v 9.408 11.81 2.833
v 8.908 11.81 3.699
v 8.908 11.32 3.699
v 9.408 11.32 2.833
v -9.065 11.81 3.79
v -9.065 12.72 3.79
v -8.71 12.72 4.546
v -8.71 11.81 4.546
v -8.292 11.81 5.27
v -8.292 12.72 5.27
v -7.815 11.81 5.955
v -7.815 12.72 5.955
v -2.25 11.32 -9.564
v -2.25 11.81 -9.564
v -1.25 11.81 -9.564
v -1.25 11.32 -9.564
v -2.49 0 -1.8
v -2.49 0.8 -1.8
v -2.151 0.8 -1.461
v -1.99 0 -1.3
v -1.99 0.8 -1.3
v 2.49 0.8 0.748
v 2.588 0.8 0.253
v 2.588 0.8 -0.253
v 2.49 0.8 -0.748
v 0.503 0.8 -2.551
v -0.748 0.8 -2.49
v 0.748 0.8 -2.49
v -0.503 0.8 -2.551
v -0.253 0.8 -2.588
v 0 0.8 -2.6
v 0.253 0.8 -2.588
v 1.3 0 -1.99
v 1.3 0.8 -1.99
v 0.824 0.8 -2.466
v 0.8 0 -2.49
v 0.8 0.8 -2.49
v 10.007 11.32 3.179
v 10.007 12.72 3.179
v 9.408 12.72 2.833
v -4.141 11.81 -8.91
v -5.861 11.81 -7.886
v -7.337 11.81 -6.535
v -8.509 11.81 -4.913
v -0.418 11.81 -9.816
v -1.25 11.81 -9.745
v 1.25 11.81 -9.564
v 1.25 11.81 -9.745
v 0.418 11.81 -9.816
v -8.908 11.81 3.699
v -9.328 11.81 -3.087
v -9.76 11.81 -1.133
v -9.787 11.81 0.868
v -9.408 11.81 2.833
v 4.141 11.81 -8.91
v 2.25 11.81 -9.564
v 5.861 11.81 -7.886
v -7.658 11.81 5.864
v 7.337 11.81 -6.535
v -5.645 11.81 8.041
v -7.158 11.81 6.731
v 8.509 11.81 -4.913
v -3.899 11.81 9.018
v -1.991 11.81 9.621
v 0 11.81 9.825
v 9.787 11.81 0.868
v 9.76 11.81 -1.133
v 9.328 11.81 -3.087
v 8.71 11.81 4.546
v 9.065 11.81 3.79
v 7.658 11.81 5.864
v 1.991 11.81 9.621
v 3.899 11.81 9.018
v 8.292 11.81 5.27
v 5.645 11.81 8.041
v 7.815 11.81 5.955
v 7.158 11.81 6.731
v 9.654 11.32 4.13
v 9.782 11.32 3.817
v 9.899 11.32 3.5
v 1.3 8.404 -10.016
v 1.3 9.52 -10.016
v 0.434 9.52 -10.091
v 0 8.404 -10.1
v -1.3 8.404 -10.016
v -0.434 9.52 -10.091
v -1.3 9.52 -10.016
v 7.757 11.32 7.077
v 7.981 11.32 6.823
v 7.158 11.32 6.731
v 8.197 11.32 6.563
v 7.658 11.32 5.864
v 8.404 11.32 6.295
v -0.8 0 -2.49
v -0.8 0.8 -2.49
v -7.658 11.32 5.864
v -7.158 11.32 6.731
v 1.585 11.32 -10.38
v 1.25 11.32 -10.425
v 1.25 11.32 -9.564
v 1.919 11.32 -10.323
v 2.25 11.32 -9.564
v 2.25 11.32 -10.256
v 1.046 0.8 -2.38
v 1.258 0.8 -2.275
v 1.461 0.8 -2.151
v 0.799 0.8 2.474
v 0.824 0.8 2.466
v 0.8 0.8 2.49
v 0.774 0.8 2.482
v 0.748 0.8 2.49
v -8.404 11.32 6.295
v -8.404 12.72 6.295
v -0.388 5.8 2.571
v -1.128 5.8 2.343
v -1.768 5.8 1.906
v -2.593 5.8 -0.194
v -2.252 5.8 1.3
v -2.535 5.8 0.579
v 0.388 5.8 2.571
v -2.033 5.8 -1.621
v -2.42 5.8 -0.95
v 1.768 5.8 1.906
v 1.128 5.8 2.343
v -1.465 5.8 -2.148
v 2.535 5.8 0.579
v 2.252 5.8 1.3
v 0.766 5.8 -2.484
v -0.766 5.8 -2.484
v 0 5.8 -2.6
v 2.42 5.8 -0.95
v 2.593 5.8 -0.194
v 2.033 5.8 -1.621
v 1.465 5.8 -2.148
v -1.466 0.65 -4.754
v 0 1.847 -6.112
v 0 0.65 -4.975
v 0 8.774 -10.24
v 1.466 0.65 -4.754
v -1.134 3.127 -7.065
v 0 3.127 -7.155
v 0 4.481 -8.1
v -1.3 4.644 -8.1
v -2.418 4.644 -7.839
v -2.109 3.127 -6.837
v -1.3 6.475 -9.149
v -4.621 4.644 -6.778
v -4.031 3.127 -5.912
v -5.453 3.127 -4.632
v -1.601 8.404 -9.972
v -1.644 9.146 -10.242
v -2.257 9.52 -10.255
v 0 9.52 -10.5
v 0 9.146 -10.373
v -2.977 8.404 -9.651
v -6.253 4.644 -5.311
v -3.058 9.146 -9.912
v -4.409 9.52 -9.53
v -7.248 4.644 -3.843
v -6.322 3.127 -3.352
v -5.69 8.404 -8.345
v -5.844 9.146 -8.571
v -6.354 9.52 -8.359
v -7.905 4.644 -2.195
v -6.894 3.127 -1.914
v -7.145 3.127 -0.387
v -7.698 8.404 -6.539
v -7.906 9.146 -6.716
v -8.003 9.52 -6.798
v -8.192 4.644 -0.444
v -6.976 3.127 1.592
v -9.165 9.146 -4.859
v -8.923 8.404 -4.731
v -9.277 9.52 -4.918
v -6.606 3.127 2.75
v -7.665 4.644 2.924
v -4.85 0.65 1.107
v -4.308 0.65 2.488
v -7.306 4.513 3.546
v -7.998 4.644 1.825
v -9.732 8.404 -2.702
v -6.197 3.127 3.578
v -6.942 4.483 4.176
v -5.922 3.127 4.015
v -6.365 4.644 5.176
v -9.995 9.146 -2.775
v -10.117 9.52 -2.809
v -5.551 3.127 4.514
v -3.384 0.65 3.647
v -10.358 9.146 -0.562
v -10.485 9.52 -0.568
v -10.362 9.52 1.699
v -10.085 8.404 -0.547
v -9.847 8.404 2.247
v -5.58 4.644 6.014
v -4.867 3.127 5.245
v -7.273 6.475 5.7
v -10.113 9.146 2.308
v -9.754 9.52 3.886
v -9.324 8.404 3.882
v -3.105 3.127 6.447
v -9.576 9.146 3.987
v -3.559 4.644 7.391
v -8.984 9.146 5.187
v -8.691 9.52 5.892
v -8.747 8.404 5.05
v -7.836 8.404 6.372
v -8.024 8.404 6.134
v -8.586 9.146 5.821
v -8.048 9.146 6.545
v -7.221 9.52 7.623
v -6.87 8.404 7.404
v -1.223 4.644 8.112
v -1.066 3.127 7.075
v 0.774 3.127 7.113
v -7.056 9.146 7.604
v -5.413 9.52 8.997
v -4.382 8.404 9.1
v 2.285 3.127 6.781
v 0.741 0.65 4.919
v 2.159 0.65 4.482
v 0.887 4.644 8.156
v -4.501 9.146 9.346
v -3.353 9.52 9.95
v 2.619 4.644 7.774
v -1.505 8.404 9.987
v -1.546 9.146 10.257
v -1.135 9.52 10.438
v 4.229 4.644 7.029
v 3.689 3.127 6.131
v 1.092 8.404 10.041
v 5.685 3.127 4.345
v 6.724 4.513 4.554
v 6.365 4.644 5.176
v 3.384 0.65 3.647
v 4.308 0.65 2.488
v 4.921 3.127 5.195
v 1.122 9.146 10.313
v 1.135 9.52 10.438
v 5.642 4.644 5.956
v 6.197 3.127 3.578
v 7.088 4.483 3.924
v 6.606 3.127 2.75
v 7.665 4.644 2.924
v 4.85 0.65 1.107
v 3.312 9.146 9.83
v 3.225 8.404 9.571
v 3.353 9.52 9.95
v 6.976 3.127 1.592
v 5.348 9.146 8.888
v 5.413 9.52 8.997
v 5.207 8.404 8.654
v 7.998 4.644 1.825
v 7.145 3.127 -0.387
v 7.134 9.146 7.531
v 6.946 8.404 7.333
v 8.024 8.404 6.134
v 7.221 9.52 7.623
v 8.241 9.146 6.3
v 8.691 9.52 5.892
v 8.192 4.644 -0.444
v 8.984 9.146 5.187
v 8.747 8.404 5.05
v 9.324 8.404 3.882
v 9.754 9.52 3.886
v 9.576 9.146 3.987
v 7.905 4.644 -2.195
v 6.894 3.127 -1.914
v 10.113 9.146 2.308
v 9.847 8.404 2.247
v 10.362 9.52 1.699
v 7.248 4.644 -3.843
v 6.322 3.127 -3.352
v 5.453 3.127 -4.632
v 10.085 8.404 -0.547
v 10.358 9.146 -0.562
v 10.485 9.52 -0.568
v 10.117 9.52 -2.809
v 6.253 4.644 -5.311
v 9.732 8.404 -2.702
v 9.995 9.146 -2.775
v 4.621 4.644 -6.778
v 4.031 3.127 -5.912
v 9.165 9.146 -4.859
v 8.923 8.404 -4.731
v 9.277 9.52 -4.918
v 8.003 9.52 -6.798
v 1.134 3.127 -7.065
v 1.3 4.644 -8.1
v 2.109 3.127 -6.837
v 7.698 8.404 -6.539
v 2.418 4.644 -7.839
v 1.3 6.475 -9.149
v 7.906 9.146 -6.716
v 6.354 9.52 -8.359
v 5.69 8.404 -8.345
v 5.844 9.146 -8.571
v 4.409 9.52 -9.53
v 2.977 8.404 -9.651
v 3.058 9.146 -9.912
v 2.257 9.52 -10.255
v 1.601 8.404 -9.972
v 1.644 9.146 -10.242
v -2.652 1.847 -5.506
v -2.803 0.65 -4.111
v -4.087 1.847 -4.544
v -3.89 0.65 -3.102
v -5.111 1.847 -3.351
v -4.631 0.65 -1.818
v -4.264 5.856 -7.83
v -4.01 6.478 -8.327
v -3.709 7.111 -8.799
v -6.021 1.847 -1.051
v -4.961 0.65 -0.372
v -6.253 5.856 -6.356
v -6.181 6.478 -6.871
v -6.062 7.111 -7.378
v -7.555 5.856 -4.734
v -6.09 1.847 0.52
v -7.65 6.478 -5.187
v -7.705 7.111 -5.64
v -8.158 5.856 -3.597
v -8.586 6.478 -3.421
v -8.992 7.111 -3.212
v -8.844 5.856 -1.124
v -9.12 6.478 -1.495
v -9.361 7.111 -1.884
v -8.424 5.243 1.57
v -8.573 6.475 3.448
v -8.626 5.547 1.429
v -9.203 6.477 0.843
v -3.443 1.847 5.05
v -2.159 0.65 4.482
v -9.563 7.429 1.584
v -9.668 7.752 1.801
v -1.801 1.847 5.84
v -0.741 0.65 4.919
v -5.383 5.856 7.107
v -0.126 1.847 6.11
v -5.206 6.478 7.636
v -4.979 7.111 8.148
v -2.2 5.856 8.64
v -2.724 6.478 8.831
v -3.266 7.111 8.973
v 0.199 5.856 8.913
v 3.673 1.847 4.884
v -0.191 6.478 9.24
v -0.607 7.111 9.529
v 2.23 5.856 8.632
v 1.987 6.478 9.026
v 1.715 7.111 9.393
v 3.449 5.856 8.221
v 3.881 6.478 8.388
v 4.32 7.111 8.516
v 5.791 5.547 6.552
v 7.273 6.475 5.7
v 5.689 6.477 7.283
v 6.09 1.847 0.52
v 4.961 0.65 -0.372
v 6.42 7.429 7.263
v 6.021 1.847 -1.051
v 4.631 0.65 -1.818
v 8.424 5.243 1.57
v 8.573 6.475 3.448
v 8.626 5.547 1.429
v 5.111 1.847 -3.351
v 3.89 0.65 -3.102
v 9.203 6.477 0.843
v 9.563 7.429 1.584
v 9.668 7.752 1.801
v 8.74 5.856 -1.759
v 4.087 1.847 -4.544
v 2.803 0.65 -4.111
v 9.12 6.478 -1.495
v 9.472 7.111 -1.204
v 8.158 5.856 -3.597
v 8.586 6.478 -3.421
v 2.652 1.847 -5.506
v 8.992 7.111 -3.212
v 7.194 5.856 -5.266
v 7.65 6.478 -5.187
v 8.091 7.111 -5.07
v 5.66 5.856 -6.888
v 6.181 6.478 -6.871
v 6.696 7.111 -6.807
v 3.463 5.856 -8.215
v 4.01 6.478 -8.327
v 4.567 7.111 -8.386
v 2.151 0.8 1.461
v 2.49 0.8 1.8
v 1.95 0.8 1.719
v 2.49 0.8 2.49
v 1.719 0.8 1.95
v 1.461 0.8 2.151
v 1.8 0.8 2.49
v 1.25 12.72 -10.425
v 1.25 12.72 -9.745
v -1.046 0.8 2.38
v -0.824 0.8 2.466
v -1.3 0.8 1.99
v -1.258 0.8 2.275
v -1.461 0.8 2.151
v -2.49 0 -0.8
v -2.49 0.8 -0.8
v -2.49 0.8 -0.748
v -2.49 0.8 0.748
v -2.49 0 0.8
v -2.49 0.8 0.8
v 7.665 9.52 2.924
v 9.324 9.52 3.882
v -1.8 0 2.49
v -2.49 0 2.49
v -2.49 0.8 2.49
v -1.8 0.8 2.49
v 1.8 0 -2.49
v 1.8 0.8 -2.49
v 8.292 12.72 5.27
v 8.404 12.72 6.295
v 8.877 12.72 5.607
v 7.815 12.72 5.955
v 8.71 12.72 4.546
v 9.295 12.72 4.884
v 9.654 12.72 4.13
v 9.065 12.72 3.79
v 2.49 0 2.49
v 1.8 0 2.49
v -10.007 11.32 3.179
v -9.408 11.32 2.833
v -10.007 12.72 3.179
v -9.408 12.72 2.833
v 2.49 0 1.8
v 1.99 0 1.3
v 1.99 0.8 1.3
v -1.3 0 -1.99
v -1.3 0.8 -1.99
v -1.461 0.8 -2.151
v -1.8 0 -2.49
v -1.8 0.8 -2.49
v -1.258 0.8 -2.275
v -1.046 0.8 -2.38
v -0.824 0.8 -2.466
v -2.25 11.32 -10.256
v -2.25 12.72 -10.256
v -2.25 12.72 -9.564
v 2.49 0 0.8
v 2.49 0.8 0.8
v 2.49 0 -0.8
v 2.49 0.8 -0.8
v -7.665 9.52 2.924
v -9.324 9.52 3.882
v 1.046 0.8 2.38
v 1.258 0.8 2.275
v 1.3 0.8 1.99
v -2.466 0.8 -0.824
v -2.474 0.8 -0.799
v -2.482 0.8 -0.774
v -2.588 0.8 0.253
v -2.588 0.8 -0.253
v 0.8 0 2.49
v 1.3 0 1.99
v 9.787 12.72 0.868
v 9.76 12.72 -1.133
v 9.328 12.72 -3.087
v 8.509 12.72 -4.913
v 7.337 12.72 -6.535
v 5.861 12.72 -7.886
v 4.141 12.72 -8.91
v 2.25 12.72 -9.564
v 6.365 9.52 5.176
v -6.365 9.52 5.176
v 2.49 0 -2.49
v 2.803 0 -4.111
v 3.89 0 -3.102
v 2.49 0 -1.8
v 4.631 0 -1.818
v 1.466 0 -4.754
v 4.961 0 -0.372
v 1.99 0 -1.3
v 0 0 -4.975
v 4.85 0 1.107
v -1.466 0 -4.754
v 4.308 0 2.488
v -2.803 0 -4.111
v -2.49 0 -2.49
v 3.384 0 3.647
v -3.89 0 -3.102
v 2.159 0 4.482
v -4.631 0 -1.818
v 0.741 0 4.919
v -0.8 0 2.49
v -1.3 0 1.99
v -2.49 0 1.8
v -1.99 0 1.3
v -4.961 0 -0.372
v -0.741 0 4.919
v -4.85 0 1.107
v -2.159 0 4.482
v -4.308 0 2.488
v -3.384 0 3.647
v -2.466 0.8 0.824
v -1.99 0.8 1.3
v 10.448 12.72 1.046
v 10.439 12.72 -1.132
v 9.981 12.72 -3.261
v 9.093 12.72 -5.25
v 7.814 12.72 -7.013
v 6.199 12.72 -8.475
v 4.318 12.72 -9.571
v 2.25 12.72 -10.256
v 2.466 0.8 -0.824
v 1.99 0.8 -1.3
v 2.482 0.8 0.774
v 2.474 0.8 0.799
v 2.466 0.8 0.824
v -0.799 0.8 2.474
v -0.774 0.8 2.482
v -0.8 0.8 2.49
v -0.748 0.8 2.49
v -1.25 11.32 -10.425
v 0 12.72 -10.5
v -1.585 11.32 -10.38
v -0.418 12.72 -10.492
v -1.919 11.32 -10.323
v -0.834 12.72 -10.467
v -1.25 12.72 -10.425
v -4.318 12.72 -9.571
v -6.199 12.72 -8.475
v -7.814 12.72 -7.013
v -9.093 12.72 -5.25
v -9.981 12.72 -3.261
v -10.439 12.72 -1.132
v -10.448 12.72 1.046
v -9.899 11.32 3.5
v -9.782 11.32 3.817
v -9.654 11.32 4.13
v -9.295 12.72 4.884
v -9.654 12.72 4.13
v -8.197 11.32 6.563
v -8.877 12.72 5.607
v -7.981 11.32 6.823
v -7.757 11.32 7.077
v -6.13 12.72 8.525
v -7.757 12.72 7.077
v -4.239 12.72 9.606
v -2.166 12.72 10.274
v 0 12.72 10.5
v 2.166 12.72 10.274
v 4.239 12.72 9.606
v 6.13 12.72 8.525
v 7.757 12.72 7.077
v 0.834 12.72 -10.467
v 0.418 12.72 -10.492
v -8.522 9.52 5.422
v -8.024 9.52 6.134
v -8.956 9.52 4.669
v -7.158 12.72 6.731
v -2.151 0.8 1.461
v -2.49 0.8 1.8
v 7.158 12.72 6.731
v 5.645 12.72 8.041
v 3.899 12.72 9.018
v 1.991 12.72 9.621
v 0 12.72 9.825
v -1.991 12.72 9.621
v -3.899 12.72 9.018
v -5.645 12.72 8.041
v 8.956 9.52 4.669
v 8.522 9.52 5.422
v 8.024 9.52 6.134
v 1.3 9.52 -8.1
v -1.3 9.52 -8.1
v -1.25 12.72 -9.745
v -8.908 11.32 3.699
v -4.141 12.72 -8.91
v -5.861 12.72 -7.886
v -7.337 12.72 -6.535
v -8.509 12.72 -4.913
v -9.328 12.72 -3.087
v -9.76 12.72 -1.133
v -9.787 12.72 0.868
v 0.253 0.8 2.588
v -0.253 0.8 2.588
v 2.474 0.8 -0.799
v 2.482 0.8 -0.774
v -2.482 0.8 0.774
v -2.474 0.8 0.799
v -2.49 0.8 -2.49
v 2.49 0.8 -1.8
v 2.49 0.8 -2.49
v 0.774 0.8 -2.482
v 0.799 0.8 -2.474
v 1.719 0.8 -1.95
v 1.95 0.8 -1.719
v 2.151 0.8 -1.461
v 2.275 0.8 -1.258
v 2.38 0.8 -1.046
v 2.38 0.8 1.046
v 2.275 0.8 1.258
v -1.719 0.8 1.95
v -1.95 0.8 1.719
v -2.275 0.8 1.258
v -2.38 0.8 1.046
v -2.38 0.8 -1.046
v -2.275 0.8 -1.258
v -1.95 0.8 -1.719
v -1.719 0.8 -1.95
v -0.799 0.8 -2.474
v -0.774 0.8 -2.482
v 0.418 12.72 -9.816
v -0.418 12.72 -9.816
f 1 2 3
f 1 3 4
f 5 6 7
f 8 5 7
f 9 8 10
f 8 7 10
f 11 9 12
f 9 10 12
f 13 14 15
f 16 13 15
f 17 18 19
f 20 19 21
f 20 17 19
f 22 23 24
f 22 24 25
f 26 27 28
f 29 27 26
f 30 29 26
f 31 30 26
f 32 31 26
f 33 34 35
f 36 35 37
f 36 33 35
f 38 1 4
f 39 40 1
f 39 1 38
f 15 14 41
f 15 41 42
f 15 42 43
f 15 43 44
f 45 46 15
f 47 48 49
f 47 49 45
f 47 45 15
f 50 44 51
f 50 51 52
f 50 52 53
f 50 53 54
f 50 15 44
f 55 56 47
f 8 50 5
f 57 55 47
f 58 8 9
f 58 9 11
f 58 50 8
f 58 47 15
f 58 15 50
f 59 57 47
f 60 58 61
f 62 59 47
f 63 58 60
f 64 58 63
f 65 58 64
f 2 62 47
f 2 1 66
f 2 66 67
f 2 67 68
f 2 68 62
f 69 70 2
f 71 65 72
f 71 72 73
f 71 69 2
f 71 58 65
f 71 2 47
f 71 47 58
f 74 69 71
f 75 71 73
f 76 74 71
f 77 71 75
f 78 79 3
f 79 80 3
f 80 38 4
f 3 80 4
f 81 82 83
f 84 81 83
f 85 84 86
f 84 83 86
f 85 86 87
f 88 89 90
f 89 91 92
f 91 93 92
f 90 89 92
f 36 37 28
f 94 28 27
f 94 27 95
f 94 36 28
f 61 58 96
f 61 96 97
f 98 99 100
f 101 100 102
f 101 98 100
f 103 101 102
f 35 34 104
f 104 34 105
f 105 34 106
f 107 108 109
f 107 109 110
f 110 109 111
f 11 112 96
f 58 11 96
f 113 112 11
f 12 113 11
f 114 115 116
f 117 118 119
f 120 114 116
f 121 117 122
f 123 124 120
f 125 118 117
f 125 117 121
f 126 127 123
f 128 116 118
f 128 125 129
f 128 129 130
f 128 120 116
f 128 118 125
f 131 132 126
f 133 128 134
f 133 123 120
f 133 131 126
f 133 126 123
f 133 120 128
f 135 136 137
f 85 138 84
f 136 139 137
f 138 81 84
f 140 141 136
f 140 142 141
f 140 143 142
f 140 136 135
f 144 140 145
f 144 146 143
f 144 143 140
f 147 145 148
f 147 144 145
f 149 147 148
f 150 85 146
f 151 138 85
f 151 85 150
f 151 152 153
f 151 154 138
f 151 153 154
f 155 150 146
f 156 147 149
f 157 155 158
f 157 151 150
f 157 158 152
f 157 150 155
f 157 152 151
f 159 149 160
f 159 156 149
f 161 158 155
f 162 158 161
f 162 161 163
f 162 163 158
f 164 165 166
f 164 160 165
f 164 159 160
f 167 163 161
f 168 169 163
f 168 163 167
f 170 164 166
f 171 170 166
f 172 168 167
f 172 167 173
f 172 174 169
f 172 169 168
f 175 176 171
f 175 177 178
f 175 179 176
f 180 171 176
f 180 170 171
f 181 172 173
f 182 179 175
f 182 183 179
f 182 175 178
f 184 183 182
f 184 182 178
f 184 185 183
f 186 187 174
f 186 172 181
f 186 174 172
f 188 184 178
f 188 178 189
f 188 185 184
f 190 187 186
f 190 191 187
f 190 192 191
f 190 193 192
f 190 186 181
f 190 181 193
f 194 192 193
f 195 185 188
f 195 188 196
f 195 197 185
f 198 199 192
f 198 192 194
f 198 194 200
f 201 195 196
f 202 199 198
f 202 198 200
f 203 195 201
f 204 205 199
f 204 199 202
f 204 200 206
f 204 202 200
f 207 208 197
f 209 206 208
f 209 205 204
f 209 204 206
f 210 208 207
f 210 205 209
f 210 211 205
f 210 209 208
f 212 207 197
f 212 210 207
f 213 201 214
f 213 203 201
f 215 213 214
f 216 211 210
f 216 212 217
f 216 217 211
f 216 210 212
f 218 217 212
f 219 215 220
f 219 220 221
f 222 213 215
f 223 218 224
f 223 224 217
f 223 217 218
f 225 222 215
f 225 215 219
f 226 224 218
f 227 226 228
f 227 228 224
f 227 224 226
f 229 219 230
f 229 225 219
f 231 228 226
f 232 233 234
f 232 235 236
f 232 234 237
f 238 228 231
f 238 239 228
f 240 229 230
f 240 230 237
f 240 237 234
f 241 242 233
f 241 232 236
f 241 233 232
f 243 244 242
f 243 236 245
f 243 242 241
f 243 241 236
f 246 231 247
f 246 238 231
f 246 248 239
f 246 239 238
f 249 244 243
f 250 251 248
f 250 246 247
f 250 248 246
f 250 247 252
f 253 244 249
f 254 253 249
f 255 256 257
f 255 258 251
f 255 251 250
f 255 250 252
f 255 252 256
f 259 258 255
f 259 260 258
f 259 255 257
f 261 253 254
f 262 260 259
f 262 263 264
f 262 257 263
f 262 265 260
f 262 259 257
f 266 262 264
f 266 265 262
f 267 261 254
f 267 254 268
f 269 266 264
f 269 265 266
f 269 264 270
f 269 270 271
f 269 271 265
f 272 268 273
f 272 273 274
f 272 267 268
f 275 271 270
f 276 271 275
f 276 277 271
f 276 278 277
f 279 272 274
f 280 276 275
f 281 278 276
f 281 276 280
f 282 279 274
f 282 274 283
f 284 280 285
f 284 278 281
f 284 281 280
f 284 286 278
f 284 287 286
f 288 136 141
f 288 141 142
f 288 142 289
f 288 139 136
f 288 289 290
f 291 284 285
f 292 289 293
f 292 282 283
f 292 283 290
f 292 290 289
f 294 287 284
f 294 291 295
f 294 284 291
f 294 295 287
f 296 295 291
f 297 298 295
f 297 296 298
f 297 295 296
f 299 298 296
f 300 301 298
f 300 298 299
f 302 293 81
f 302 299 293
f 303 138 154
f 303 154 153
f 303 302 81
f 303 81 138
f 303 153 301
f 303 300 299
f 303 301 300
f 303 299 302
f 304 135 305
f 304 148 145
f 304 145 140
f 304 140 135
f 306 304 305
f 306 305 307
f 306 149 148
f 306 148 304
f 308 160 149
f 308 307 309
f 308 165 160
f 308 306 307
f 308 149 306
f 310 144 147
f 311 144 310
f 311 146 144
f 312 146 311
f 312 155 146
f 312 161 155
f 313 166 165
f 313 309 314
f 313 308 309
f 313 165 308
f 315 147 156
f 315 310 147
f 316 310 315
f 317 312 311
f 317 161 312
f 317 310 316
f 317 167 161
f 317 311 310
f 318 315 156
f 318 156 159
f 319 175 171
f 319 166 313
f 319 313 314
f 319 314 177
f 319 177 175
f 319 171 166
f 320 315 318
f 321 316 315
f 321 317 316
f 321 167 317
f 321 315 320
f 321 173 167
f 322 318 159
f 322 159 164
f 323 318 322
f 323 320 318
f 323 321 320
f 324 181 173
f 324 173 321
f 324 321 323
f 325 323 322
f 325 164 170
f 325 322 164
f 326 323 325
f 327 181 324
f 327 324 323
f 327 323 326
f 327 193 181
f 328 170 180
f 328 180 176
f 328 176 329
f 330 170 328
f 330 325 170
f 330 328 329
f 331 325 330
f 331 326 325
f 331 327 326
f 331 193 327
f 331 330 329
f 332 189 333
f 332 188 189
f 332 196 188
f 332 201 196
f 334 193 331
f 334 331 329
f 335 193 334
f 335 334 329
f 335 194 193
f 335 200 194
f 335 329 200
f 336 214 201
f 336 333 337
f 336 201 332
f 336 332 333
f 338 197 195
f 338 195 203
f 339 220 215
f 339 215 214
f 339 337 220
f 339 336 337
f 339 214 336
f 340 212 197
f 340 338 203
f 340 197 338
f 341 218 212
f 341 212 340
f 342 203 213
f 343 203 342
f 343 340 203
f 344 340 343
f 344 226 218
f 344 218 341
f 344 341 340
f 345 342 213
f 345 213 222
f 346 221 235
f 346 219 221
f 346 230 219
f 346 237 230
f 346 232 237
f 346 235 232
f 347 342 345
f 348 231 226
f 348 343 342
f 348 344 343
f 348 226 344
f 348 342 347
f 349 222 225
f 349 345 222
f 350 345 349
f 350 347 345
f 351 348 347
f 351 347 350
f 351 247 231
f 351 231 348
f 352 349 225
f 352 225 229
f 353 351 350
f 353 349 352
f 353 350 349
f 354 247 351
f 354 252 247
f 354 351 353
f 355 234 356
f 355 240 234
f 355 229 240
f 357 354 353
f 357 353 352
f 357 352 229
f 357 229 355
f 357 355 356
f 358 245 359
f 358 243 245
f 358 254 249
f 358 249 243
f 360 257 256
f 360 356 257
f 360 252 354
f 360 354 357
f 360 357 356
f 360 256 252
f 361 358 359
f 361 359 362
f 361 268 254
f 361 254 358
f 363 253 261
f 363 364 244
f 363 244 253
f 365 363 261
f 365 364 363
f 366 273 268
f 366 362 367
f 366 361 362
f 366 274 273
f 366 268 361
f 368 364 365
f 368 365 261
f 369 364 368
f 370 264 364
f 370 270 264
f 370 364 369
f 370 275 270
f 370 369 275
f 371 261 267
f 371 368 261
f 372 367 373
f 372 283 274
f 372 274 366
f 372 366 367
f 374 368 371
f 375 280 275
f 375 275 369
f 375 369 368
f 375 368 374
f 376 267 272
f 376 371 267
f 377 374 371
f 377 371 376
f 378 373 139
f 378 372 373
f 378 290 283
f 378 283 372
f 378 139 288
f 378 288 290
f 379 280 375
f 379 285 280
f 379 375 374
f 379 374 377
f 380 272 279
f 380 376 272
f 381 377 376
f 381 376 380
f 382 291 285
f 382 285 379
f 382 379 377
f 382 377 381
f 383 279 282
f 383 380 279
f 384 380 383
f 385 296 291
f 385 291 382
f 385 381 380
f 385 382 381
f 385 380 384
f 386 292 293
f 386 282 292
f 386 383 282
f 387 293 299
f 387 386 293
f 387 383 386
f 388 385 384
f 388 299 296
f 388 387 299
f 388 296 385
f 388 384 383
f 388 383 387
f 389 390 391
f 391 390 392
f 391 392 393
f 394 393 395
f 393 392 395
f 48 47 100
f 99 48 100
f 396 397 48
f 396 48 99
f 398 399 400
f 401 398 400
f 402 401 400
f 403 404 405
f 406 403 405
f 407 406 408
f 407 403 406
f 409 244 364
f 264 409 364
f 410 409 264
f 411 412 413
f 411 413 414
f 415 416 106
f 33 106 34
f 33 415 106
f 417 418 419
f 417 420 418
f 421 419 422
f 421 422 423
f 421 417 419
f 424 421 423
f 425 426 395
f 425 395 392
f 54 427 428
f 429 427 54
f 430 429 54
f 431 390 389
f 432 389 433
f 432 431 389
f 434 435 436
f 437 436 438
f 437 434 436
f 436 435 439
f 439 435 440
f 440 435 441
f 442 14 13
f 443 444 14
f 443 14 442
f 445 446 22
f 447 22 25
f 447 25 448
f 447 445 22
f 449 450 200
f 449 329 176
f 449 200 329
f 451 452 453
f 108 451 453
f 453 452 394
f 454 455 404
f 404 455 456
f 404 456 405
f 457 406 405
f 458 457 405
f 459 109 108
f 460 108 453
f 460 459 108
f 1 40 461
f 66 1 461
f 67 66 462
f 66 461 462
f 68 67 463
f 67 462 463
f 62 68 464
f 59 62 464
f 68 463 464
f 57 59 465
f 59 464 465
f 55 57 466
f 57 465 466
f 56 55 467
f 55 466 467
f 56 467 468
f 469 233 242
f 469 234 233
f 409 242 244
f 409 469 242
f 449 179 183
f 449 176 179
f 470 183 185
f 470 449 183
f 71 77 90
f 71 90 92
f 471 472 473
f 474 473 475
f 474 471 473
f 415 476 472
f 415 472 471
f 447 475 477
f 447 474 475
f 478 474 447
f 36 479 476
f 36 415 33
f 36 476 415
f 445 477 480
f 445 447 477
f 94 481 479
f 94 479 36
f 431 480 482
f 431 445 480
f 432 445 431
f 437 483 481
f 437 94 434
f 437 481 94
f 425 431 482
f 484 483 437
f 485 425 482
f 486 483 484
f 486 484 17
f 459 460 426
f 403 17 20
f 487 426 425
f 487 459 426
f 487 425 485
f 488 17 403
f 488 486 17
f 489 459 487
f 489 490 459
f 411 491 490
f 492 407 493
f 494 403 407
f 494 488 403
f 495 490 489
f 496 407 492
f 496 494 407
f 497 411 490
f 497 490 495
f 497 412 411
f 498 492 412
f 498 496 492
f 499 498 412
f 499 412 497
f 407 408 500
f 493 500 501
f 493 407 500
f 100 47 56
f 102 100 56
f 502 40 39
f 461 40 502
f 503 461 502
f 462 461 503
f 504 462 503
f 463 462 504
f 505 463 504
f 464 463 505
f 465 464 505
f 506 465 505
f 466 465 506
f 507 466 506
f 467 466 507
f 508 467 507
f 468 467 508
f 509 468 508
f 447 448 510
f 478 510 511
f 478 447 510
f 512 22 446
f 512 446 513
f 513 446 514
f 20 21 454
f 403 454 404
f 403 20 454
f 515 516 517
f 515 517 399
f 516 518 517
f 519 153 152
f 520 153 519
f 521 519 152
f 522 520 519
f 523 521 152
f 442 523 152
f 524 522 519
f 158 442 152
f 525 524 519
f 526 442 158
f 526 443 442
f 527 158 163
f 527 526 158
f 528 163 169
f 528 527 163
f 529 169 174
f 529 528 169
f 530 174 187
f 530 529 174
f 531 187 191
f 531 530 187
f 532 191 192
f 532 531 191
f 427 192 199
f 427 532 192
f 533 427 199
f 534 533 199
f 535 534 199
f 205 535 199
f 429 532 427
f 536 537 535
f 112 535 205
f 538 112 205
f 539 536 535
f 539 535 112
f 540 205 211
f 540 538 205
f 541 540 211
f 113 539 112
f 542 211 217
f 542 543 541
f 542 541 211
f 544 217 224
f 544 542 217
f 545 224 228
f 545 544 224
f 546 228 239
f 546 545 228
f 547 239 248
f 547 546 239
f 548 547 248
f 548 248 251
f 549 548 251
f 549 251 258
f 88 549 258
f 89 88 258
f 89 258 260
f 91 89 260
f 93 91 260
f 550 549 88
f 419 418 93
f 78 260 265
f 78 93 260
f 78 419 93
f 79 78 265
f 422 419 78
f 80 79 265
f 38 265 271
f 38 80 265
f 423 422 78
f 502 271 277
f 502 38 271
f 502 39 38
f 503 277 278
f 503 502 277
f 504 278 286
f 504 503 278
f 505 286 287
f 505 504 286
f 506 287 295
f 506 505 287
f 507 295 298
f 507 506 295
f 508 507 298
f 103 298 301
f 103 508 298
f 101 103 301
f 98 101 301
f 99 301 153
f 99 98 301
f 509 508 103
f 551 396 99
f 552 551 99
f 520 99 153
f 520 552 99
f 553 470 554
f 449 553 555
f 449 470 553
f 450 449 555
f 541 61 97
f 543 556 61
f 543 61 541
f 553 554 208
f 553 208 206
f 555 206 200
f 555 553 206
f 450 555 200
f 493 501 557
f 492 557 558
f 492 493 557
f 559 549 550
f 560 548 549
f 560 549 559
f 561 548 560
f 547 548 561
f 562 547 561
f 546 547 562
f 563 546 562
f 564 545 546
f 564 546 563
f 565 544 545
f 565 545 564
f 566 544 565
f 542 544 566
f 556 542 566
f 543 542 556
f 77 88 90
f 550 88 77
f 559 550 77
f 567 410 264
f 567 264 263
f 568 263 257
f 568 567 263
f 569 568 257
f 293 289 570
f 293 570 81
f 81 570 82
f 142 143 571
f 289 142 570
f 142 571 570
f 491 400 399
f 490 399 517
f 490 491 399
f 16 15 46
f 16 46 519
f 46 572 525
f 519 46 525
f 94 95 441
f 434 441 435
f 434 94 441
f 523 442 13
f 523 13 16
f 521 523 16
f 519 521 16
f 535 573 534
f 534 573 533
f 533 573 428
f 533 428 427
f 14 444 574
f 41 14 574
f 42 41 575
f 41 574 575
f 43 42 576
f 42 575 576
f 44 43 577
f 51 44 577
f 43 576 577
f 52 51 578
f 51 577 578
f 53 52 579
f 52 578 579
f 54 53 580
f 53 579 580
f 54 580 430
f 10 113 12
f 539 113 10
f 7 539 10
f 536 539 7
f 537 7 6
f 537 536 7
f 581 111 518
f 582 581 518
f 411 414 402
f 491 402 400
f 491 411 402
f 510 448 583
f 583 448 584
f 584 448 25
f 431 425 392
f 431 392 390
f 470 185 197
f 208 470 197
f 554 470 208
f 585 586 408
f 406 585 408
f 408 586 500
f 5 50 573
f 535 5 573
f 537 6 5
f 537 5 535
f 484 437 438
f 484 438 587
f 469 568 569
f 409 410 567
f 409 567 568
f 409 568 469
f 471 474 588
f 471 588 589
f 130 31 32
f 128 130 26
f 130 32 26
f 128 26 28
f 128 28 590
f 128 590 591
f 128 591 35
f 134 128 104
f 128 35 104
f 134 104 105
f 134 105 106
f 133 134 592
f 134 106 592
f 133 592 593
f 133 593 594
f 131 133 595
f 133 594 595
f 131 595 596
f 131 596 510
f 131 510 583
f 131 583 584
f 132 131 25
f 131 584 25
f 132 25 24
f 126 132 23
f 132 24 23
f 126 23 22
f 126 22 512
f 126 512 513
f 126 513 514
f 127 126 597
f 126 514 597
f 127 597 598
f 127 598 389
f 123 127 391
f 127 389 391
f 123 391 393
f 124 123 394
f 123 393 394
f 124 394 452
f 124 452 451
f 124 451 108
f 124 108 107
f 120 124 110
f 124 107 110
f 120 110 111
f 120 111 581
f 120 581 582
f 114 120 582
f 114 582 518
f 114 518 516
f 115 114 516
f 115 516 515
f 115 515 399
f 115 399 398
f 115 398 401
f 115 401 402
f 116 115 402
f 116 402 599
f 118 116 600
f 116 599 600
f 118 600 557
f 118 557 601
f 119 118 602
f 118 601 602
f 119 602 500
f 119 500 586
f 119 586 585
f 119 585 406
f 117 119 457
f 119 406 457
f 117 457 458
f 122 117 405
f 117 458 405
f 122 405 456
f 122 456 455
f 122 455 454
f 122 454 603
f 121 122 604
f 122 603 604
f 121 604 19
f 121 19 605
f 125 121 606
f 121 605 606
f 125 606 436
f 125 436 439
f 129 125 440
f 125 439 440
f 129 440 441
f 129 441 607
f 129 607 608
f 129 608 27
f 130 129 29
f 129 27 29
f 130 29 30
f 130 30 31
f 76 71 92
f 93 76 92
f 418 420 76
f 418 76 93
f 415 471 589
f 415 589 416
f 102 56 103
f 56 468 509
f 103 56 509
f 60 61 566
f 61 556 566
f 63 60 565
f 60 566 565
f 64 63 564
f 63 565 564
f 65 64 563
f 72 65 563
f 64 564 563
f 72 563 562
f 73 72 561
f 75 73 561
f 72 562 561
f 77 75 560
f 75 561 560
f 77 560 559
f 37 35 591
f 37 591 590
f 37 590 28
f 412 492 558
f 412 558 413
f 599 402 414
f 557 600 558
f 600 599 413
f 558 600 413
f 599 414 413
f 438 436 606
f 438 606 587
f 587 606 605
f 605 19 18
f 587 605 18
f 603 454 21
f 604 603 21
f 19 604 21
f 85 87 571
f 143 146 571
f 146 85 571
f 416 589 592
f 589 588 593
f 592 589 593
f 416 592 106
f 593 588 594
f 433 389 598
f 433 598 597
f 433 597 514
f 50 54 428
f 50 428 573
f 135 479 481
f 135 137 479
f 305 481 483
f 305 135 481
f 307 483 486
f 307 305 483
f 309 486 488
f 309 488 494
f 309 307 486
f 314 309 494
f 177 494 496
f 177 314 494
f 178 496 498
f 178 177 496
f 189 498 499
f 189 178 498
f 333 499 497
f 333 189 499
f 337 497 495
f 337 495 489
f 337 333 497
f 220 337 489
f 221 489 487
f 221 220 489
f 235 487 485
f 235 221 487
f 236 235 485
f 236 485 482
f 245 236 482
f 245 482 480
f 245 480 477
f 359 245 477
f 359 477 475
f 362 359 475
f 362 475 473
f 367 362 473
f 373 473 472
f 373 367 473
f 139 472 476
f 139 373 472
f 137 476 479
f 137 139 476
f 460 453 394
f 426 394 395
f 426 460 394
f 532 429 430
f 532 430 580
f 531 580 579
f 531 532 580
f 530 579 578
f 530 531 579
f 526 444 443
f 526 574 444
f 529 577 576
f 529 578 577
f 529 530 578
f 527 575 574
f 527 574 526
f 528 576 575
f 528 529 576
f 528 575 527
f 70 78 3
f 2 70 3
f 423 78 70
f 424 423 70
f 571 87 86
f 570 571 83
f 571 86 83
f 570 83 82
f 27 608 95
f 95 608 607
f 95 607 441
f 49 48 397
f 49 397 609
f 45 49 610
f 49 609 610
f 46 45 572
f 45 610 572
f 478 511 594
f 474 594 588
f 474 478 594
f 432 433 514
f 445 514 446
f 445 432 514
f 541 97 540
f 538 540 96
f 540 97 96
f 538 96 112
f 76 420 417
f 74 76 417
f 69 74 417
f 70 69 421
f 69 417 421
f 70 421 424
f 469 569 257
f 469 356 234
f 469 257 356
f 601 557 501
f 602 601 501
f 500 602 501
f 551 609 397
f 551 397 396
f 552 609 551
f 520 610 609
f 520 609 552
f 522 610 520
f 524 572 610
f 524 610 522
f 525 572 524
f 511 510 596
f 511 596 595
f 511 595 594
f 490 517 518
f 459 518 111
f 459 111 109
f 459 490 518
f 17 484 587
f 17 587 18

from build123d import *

# Parameters (mm, degrees)
SKETCH3_R                    = 9.825
LENS_TOP_CUT_EXTRUDE2_DEPTH  = 0.91
SKETCH2_W                    = 1
SKETCH2_H                    = 0.861432774
TOP_CUT_EXTRUDE3_DEPTH       = 1.4
BOTTOM_CUT_EXTRUDE4_DEPTH    = 0.8
SIDE_CUT_EXTRUDE5_DEPTH      = 8
SKETCH6_R                    = 2.6
LENS_HOLE_CUT_EXTRUDE7_DEPTH = 5


with BuildPart() as part:
    # Sketch1 → Lens Holder (revolve)
    with BuildSketch(Plane.XY, mode=Mode.PRIVATE) as lens_holder_sk:
        with BuildLine():
            Line((0, 0), (4.975, 0))
            Line((4.975, 0), (4.975, 0.65))
            ThreePointArc((4.975, 0.65), (8.271800133, 4.752191856), (10.5, 9.52))
            Line((10.5, 9.52), (10.5, 12.72))
            Line((10.5, 12.72), (0, 12.72))
            Line((0, 12.72), (0, 0))
        make_face()
    revolve(lens_holder_sk.sketch.rotate(Axis((0, 0, 0), (0, 1, 0)), 90), axis=Axis((0, 0, 0), (0, 1, 0)))

    # Sketch3 → Lens Top Cut-Extrude2 (cut)
    with BuildSketch(Plane(origin=(0, 12.72, 0), x_dir=(1, 0, 0), z_dir=(0, 1, 0))):
        with Locations(Location((0, 0, 0), (0, 0, 270))):
            Circle(SKETCH3_R)
    extrude(amount=-LENS_TOP_CUT_EXTRUDE2_DEPTH, mode=Mode.SUBTRACT)

    # Sketch2 → Top Cut-Extrude3 (cut)
    with BuildSketch(Plane(origin=(0, 12.72, 0), x_dir=(1, 0, 0), z_dir=(0, 1, 0))):
        Polygon((8.40360039, -6.29519662), (7.90360039, -7.161222024), (7.157577724, -6.730505637), (7.657577724, -5.864480233), align=None)
        with Locations((1.75, 9.994613344)):
            Rectangle(SKETCH2_W, SKETCH2_H)
        with Locations((-1.75, 9.994613344)):
            Rectangle(SKETCH2_W, SKETCH2_H)
        Polygon((10.15360039, -3.264107707), (9.65360039, -4.130133111), (8.907577724, -3.699416724), (9.407577724, -2.83339132), align=None)
        Polygon((-9.65360039, -4.130133111), (-10.15360039, -3.264107707), (-9.407577724, -2.83339132), (-8.907577724, -3.699416724), align=None)
        Polygon((-7.90360039, -7.161222024), (-8.40360039, -6.29519662), (-7.657577724, -5.864480233), (-7.157577724, -6.730505637), align=None)
    extrude(amount=-TOP_CUT_EXTRUDE3_DEPTH, mode=Mode.SUBTRACT)

    # Sketch4 → Bottom Cut-Extrude4 (cut)
    with BuildSketch(Plane.XZ):
        Polygon((2.49, 1.8), (1.99, 1.3), (2.49, 0.8), (2.49, -0.8), (1.99, -1.3), (2.49, -1.8), (2.49, -2.49), (1.8, -2.49), (1.3, -1.99), (0.8, -2.49), (-0.8, -2.49), (-1.3, -1.99), (-1.8, -2.49), (-2.49, -2.49), (-2.49, -1.8), (-1.99, -1.3), (-2.49, -0.8), (-2.49, 0.8), (-1.99, 1.3), (-2.49, 1.8), (-2.49, 2.49), (-1.8, 2.49), (-1.3, 1.99), (-0.8, 2.49), (0.8, 2.49), (1.3, 1.99), (1.8, 2.49), (2.49, 2.49), align=None)
    extrude(amount=-BOTTOM_CUT_EXTRUDE4_DEPTH, mode=Mode.SUBTRACT)

    # Sketch5 → Side Cut-Extrude5 (cut)
    with BuildSketch(Plane(origin=(0, 9.52, 0), x_dir=(1, 0, 0), z_dir=(0, 1, 0))):
        with BuildLine():
            Line((-1.3, 10.01598722), (-1.3, 8.1))
            Line((-1.3, 8.1), (1.3, 8.1))
            Line((1.3, 8.1), (1.3, 10.01598722))
            ThreePointArc((1.3, 10.01598722), (0, 10.1), (-1.3, 10.01598722))
        make_face()
        with BuildLine():
            Line((8.024099377, -6.133826635), (6.364805771, -5.175833025))
            Line((6.364805771, -5.175833025), (7.664805771, -2.924166975))
            Line((7.664805771, -2.924166975), (9.324099377, -3.882160585))
            ThreePointArc((9.324099377, -3.882160585), (8.746856578, -5.05), (8.024099377, -6.133826635))
        make_face()
        with BuildLine():
            Line((-9.324099377, -3.882160585), (-7.664805771, -2.924166975))
            Line((-7.664805771, -2.924166975), (-6.364805771, -5.175833025))
            Line((-6.364805771, -5.175833025), (-8.024099377, -6.133826635))
            ThreePointArc((-8.024099377, -6.133826635), (-8.746856578, -5.05), (-9.324099377, -3.882160585))
        make_face()
    extrude(amount=-SIDE_CUT_EXTRUDE5_DEPTH, mode=Mode.SUBTRACT)

    # Sketch6 → Lens Hole Cut-Extrude7 (cut)
    with BuildSketch(Plane.XZ.offset(-0.8)):
        with Locations(Location((0, 0, 0), (0, 0, 270))):
            Circle(SKETCH6_R)
    extrude(amount=-LENS_HOLE_CUT_EXTRUDE7_DEPTH, mode=Mode.SUBTRACT)


solid = part.part
